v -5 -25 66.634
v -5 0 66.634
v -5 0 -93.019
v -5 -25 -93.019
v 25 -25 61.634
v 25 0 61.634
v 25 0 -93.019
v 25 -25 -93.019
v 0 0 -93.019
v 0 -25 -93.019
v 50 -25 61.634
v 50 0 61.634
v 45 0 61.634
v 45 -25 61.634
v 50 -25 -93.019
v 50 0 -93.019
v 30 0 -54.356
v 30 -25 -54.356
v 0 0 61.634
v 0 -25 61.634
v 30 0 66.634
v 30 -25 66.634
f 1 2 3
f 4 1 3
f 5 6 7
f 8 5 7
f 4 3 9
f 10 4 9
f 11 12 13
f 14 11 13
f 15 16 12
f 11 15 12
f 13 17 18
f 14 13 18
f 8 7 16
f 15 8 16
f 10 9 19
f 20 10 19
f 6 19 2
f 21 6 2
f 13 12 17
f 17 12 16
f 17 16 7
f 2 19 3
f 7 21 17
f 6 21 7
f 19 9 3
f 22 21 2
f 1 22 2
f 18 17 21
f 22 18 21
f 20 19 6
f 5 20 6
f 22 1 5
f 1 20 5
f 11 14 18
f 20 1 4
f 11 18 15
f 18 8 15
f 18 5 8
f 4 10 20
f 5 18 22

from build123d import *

# Parameters (mm, degrees)
F1_DEPTH   = 25
F1_FACE_W  = 5
F1_FACE_H  = 25
F1_FACE1_W = 25
F1_FACE1_H = 25


with BuildPart() as f1:
    # F0 (on Front) → F1 (new body)
    with BuildSketch(Plane.XZ):
        Polygon((0, -93.0193822413), (0, 61.6336810916), (25, 61.6336810916), (25, -93.0193822413), (50, -93.0193822413), (50, 61.6336810916), (45, 61.6336810916), (45, -88.0193822413), (30, -88.0193822413), (30, 66.6336810916), (-5, 66.6336810916), (-5, -93.0193822413), align=None)
    extrude(amount=F1_DEPTH)

    # F1_face (on face) → F2 section 0
    with BuildSketch(Plane(origin=(47.5, -12.5, 61.6336810916), x_dir=(1, 0, 0), z_dir=(0, 0, 1))):
        Rectangle(F1_FACE_W, F1_FACE_H)
    # F1_face1 (on face) → F2 section 1
    with BuildSketch(Plane(origin=(37.5, -12.5, -93.0193822413), x_dir=(1, 0, 0), z_dir=(0, 0, -1))):
        Rectangle(F1_FACE1_W, F1_FACE1_H)
    loft()


solid = f1.part
